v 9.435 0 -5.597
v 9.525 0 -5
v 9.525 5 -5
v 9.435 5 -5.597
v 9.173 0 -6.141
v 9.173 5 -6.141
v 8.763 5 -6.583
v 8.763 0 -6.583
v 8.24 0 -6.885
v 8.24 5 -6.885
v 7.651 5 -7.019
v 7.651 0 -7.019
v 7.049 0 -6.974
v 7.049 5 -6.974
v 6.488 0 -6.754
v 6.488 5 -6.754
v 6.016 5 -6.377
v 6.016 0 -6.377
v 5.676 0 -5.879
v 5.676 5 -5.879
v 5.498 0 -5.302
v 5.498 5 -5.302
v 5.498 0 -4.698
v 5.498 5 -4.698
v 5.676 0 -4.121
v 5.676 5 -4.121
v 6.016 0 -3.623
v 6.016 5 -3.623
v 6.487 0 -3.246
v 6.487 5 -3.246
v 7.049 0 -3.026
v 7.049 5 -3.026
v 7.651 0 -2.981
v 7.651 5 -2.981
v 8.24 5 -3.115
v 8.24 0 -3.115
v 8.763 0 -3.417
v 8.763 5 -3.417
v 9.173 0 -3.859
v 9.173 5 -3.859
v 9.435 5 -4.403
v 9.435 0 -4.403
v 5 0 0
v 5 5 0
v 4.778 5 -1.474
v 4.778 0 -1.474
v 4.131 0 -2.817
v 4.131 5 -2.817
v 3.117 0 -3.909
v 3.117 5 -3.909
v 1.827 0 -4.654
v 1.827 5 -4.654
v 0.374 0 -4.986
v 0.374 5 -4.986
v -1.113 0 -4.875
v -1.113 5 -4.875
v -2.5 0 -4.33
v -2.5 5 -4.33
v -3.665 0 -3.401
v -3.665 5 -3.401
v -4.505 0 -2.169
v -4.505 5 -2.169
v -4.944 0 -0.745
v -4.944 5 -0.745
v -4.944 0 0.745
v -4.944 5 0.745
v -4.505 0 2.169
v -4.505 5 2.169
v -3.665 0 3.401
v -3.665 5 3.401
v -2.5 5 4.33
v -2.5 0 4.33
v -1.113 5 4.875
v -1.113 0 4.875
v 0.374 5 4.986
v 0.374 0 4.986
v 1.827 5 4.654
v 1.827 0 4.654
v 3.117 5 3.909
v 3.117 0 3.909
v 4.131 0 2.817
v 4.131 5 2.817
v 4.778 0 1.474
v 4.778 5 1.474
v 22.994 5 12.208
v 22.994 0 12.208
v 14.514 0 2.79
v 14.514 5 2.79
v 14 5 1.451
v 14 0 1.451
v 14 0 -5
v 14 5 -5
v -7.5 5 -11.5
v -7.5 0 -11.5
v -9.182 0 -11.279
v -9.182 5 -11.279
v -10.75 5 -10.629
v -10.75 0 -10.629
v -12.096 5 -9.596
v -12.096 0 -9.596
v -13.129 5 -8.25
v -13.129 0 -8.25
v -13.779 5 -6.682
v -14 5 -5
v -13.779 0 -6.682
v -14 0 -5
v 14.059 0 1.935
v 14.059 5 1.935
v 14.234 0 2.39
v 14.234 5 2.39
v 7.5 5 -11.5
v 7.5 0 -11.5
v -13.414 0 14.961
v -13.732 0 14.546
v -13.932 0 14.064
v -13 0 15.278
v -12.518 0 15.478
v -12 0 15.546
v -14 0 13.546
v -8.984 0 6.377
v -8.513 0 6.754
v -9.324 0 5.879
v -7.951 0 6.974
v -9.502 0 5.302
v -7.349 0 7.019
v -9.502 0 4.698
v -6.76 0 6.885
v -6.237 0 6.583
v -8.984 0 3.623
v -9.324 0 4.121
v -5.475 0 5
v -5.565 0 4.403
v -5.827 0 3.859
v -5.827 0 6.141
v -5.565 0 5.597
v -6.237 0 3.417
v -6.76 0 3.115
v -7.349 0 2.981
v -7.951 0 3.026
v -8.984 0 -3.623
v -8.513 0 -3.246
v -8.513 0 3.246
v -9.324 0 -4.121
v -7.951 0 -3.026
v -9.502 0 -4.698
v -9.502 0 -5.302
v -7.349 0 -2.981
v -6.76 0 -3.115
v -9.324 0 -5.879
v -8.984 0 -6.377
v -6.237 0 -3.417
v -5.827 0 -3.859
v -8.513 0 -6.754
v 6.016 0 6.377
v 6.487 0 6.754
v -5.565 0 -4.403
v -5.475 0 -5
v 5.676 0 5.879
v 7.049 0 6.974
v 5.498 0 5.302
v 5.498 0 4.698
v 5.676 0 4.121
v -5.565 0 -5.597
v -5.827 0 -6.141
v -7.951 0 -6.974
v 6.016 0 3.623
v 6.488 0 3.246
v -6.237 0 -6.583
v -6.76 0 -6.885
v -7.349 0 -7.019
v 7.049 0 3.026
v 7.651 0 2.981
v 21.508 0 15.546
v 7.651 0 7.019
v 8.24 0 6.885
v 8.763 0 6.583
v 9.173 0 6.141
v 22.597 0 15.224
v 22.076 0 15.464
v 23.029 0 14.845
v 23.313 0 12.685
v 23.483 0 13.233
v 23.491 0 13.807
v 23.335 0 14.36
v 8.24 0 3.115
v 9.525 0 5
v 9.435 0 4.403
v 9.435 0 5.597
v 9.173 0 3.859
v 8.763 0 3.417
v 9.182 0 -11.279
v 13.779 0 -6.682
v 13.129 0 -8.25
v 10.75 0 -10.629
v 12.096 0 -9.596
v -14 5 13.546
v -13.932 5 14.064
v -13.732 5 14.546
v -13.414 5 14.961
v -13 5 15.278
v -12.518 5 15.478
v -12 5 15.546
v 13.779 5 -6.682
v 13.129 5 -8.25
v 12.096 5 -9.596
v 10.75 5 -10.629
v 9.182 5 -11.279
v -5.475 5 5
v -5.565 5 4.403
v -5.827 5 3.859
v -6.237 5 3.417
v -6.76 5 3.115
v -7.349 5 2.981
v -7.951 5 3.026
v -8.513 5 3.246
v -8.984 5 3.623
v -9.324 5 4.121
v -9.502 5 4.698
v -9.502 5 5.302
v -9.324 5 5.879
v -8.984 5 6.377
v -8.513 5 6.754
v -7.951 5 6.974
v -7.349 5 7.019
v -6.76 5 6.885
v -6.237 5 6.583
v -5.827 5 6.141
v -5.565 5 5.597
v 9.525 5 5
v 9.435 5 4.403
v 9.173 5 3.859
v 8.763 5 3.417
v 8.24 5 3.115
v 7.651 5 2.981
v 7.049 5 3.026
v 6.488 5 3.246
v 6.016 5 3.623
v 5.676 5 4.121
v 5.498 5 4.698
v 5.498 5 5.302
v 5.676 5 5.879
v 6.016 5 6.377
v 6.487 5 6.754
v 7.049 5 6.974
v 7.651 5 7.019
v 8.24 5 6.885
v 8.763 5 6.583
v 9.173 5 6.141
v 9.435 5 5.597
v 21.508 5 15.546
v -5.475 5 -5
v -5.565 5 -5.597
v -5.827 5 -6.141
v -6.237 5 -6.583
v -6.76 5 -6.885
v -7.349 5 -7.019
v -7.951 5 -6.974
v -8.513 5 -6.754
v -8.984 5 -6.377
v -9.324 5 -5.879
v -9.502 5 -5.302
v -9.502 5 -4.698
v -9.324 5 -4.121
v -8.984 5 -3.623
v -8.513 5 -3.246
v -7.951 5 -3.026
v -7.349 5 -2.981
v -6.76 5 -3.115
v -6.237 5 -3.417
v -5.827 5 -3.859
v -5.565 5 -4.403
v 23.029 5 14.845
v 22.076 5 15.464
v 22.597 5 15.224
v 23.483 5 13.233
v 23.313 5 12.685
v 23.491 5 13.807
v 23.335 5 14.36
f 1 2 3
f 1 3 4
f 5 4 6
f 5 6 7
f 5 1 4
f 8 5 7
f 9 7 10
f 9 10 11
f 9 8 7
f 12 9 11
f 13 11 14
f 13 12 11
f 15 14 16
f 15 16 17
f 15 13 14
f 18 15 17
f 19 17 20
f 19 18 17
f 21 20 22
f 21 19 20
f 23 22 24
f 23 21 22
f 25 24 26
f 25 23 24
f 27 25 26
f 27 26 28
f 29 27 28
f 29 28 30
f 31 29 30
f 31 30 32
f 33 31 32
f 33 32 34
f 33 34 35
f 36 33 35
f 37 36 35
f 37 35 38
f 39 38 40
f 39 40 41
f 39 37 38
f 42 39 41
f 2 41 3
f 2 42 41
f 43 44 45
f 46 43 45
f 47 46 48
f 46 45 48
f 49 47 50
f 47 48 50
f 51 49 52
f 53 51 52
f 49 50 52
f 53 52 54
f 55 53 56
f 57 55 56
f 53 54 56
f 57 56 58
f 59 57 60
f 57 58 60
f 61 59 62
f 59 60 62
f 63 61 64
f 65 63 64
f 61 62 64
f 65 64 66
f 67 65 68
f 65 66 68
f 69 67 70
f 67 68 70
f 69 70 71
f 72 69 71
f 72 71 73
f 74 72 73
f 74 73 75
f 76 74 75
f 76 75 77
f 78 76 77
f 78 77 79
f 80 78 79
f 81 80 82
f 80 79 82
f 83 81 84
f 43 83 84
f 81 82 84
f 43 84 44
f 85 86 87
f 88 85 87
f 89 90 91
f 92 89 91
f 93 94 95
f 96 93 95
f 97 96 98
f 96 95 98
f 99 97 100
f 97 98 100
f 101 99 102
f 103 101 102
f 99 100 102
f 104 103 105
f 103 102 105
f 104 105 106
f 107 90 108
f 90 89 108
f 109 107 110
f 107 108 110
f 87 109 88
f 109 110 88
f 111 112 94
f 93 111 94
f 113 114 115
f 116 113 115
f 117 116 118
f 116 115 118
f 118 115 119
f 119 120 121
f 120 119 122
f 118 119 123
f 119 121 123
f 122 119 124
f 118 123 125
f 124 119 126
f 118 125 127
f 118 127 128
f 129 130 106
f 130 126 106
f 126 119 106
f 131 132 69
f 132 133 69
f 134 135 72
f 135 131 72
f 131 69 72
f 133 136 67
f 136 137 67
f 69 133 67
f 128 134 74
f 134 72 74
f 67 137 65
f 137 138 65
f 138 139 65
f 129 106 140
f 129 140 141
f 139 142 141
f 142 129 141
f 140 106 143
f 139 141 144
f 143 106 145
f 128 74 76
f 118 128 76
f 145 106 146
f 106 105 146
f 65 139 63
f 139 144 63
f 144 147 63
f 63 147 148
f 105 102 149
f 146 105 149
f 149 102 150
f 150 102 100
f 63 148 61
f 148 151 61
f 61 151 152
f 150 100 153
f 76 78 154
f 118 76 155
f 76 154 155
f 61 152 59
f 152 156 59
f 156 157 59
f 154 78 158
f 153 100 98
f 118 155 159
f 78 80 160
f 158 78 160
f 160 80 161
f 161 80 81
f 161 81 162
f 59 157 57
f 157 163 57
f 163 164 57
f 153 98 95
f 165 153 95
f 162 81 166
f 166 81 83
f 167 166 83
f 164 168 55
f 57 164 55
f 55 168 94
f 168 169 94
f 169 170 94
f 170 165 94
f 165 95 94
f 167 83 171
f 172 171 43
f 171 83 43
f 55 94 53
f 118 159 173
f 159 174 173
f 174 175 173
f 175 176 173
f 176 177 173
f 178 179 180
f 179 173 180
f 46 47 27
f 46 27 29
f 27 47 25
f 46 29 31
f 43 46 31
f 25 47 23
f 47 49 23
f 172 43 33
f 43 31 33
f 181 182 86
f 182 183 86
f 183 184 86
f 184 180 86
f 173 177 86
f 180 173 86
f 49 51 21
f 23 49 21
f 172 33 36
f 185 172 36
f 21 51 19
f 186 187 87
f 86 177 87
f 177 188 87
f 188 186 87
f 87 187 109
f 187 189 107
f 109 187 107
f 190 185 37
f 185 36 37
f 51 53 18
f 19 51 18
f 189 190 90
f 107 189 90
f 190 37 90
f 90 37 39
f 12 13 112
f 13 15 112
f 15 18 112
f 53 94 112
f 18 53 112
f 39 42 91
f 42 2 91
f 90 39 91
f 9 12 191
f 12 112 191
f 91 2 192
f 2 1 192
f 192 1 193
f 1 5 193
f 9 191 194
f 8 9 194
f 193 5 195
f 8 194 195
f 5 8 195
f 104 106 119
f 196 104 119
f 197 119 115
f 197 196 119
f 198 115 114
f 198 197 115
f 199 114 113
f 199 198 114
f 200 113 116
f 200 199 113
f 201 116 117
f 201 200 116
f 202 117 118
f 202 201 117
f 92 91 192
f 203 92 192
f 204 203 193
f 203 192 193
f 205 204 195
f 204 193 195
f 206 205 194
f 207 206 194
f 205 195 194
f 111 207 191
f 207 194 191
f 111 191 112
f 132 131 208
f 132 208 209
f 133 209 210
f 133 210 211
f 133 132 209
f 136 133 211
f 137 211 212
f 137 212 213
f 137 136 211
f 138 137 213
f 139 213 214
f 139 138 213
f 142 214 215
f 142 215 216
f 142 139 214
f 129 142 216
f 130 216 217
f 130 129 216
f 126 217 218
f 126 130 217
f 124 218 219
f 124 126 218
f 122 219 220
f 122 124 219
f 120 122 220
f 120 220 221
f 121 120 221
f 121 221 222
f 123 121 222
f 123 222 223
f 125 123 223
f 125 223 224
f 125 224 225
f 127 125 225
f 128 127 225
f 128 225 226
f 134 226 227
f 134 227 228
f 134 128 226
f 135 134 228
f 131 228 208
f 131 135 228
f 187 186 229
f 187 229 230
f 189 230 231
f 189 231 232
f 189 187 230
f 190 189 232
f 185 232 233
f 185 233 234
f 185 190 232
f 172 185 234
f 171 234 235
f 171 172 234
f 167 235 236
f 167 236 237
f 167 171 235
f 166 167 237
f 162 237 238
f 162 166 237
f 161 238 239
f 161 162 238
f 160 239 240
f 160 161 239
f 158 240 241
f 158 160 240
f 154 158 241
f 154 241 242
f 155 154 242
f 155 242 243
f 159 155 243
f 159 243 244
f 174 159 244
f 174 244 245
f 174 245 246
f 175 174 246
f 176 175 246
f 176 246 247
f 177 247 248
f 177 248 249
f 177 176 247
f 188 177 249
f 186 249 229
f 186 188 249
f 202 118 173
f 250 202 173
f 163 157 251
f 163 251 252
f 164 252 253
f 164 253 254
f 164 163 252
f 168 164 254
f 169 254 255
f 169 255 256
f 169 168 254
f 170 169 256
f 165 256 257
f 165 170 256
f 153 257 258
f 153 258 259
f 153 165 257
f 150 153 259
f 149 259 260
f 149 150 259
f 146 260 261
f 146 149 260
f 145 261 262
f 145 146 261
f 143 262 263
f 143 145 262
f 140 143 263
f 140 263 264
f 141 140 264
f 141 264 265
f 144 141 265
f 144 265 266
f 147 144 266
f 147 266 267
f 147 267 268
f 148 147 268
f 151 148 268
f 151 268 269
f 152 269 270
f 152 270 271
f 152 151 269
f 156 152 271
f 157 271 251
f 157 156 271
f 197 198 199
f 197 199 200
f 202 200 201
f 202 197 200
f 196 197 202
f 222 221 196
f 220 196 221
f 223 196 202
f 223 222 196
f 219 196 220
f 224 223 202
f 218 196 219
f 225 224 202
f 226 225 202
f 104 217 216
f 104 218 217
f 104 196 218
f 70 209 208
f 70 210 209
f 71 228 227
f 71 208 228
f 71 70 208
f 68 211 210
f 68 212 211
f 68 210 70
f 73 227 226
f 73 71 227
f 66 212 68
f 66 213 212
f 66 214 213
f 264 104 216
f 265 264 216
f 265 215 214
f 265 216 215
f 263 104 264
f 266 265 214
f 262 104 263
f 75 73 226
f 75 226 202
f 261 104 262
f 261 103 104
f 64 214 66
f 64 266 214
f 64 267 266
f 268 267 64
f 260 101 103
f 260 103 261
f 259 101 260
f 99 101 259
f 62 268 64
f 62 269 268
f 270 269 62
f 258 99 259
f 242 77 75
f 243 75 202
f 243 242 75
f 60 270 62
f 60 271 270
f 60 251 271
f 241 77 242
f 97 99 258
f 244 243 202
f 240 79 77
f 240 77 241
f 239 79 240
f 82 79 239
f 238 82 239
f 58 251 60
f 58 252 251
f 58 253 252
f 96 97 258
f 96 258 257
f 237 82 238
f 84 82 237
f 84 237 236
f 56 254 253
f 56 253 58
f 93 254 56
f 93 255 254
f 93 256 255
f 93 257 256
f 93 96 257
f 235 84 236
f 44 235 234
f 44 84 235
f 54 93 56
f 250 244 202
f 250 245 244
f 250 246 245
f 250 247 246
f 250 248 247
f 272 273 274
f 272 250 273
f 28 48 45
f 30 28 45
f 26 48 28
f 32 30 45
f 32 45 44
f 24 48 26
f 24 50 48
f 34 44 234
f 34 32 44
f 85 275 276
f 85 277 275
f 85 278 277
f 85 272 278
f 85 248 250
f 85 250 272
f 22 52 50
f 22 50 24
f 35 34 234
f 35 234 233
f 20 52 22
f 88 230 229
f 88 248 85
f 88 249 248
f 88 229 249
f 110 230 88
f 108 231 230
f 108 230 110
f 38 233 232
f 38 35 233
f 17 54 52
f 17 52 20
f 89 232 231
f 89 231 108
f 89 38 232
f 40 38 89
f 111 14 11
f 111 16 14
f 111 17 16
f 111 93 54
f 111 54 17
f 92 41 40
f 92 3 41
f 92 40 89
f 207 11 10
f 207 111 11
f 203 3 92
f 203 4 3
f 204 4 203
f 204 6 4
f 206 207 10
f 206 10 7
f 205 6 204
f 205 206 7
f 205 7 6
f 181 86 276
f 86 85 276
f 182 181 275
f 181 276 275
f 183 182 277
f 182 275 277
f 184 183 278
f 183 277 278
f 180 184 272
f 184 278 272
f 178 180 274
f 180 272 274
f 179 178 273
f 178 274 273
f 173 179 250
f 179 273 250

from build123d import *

# Parameters (mm, degrees)
SKETCH_1_R          = 2.025
EXTRUDE_1_DEPTH     = 5
FILLET_1_R          = 2
SKETCH_2_R          = 5
CUT_EXTRUDE_1_DEPTH = 5


with BuildPart() as part:
    # 草图1 → 凸台-拉伸1 (new body)
    with BuildSketch(Plane(origin=(0, 0, 0), x_dir=(1, 0, 0), z_dir=(0, 1, 0))):
        with BuildLine():
            Line((7.5, 11.5), (-7.5, 11.5))
            ThreePointArc((-7.5, 11.5), (-12.096194078, 9.596194078), (-14, 5))
            Line((-14, 5), (-14, -15.546331524))
            Line((-14, -15.546331524), (26, -15.546331524))
            Line((26, -15.546331524), (14, -2.218981346))
            Line((14, -2.218981346), (14, 5))
            ThreePointArc((14, 5), (12.096194078, 9.596194078), (7.5, 11.5))
        make_face()
        with Locations((-7.5, -5)):
            Circle(SKETCH_1_R, mode=Mode.SUBTRACT)
        with Locations((7.5, -5)):
            Circle(SKETCH_1_R, mode=Mode.SUBTRACT)
        with Locations((-7.5, 5)):
            Circle(SKETCH_1_R, mode=Mode.SUBTRACT)
        with Locations((7.5, 5)):
            Circle(SKETCH_1_R, mode=Mode.SUBTRACT)
    extrude(amount=EXTRUDE_1_DEPTH)

    # 圆角1
    fillet_1_edges = [part.edges().sort_by_distance(p)[0] for p in [
        (14, 2.5, 2.218981346),
        (26, 2.5, 15.546331524),
        (-14, 2.5, 15.546331524),
    ]]
    fillet(fillet_1_edges, radius=FILLET_1_R)

    # 草图2 → 切除-拉伸1 (cut)
    with BuildSketch(Plane(origin=(0, 5, 0), x_dir=(1, 0, 0), z_dir=(0, 1, 0))):
        Circle(SKETCH_2_R)
    extrude(amount=-CUT_EXTRUDE_1_DEPTH, mode=Mode.SUBTRACT)


solid = part.part
